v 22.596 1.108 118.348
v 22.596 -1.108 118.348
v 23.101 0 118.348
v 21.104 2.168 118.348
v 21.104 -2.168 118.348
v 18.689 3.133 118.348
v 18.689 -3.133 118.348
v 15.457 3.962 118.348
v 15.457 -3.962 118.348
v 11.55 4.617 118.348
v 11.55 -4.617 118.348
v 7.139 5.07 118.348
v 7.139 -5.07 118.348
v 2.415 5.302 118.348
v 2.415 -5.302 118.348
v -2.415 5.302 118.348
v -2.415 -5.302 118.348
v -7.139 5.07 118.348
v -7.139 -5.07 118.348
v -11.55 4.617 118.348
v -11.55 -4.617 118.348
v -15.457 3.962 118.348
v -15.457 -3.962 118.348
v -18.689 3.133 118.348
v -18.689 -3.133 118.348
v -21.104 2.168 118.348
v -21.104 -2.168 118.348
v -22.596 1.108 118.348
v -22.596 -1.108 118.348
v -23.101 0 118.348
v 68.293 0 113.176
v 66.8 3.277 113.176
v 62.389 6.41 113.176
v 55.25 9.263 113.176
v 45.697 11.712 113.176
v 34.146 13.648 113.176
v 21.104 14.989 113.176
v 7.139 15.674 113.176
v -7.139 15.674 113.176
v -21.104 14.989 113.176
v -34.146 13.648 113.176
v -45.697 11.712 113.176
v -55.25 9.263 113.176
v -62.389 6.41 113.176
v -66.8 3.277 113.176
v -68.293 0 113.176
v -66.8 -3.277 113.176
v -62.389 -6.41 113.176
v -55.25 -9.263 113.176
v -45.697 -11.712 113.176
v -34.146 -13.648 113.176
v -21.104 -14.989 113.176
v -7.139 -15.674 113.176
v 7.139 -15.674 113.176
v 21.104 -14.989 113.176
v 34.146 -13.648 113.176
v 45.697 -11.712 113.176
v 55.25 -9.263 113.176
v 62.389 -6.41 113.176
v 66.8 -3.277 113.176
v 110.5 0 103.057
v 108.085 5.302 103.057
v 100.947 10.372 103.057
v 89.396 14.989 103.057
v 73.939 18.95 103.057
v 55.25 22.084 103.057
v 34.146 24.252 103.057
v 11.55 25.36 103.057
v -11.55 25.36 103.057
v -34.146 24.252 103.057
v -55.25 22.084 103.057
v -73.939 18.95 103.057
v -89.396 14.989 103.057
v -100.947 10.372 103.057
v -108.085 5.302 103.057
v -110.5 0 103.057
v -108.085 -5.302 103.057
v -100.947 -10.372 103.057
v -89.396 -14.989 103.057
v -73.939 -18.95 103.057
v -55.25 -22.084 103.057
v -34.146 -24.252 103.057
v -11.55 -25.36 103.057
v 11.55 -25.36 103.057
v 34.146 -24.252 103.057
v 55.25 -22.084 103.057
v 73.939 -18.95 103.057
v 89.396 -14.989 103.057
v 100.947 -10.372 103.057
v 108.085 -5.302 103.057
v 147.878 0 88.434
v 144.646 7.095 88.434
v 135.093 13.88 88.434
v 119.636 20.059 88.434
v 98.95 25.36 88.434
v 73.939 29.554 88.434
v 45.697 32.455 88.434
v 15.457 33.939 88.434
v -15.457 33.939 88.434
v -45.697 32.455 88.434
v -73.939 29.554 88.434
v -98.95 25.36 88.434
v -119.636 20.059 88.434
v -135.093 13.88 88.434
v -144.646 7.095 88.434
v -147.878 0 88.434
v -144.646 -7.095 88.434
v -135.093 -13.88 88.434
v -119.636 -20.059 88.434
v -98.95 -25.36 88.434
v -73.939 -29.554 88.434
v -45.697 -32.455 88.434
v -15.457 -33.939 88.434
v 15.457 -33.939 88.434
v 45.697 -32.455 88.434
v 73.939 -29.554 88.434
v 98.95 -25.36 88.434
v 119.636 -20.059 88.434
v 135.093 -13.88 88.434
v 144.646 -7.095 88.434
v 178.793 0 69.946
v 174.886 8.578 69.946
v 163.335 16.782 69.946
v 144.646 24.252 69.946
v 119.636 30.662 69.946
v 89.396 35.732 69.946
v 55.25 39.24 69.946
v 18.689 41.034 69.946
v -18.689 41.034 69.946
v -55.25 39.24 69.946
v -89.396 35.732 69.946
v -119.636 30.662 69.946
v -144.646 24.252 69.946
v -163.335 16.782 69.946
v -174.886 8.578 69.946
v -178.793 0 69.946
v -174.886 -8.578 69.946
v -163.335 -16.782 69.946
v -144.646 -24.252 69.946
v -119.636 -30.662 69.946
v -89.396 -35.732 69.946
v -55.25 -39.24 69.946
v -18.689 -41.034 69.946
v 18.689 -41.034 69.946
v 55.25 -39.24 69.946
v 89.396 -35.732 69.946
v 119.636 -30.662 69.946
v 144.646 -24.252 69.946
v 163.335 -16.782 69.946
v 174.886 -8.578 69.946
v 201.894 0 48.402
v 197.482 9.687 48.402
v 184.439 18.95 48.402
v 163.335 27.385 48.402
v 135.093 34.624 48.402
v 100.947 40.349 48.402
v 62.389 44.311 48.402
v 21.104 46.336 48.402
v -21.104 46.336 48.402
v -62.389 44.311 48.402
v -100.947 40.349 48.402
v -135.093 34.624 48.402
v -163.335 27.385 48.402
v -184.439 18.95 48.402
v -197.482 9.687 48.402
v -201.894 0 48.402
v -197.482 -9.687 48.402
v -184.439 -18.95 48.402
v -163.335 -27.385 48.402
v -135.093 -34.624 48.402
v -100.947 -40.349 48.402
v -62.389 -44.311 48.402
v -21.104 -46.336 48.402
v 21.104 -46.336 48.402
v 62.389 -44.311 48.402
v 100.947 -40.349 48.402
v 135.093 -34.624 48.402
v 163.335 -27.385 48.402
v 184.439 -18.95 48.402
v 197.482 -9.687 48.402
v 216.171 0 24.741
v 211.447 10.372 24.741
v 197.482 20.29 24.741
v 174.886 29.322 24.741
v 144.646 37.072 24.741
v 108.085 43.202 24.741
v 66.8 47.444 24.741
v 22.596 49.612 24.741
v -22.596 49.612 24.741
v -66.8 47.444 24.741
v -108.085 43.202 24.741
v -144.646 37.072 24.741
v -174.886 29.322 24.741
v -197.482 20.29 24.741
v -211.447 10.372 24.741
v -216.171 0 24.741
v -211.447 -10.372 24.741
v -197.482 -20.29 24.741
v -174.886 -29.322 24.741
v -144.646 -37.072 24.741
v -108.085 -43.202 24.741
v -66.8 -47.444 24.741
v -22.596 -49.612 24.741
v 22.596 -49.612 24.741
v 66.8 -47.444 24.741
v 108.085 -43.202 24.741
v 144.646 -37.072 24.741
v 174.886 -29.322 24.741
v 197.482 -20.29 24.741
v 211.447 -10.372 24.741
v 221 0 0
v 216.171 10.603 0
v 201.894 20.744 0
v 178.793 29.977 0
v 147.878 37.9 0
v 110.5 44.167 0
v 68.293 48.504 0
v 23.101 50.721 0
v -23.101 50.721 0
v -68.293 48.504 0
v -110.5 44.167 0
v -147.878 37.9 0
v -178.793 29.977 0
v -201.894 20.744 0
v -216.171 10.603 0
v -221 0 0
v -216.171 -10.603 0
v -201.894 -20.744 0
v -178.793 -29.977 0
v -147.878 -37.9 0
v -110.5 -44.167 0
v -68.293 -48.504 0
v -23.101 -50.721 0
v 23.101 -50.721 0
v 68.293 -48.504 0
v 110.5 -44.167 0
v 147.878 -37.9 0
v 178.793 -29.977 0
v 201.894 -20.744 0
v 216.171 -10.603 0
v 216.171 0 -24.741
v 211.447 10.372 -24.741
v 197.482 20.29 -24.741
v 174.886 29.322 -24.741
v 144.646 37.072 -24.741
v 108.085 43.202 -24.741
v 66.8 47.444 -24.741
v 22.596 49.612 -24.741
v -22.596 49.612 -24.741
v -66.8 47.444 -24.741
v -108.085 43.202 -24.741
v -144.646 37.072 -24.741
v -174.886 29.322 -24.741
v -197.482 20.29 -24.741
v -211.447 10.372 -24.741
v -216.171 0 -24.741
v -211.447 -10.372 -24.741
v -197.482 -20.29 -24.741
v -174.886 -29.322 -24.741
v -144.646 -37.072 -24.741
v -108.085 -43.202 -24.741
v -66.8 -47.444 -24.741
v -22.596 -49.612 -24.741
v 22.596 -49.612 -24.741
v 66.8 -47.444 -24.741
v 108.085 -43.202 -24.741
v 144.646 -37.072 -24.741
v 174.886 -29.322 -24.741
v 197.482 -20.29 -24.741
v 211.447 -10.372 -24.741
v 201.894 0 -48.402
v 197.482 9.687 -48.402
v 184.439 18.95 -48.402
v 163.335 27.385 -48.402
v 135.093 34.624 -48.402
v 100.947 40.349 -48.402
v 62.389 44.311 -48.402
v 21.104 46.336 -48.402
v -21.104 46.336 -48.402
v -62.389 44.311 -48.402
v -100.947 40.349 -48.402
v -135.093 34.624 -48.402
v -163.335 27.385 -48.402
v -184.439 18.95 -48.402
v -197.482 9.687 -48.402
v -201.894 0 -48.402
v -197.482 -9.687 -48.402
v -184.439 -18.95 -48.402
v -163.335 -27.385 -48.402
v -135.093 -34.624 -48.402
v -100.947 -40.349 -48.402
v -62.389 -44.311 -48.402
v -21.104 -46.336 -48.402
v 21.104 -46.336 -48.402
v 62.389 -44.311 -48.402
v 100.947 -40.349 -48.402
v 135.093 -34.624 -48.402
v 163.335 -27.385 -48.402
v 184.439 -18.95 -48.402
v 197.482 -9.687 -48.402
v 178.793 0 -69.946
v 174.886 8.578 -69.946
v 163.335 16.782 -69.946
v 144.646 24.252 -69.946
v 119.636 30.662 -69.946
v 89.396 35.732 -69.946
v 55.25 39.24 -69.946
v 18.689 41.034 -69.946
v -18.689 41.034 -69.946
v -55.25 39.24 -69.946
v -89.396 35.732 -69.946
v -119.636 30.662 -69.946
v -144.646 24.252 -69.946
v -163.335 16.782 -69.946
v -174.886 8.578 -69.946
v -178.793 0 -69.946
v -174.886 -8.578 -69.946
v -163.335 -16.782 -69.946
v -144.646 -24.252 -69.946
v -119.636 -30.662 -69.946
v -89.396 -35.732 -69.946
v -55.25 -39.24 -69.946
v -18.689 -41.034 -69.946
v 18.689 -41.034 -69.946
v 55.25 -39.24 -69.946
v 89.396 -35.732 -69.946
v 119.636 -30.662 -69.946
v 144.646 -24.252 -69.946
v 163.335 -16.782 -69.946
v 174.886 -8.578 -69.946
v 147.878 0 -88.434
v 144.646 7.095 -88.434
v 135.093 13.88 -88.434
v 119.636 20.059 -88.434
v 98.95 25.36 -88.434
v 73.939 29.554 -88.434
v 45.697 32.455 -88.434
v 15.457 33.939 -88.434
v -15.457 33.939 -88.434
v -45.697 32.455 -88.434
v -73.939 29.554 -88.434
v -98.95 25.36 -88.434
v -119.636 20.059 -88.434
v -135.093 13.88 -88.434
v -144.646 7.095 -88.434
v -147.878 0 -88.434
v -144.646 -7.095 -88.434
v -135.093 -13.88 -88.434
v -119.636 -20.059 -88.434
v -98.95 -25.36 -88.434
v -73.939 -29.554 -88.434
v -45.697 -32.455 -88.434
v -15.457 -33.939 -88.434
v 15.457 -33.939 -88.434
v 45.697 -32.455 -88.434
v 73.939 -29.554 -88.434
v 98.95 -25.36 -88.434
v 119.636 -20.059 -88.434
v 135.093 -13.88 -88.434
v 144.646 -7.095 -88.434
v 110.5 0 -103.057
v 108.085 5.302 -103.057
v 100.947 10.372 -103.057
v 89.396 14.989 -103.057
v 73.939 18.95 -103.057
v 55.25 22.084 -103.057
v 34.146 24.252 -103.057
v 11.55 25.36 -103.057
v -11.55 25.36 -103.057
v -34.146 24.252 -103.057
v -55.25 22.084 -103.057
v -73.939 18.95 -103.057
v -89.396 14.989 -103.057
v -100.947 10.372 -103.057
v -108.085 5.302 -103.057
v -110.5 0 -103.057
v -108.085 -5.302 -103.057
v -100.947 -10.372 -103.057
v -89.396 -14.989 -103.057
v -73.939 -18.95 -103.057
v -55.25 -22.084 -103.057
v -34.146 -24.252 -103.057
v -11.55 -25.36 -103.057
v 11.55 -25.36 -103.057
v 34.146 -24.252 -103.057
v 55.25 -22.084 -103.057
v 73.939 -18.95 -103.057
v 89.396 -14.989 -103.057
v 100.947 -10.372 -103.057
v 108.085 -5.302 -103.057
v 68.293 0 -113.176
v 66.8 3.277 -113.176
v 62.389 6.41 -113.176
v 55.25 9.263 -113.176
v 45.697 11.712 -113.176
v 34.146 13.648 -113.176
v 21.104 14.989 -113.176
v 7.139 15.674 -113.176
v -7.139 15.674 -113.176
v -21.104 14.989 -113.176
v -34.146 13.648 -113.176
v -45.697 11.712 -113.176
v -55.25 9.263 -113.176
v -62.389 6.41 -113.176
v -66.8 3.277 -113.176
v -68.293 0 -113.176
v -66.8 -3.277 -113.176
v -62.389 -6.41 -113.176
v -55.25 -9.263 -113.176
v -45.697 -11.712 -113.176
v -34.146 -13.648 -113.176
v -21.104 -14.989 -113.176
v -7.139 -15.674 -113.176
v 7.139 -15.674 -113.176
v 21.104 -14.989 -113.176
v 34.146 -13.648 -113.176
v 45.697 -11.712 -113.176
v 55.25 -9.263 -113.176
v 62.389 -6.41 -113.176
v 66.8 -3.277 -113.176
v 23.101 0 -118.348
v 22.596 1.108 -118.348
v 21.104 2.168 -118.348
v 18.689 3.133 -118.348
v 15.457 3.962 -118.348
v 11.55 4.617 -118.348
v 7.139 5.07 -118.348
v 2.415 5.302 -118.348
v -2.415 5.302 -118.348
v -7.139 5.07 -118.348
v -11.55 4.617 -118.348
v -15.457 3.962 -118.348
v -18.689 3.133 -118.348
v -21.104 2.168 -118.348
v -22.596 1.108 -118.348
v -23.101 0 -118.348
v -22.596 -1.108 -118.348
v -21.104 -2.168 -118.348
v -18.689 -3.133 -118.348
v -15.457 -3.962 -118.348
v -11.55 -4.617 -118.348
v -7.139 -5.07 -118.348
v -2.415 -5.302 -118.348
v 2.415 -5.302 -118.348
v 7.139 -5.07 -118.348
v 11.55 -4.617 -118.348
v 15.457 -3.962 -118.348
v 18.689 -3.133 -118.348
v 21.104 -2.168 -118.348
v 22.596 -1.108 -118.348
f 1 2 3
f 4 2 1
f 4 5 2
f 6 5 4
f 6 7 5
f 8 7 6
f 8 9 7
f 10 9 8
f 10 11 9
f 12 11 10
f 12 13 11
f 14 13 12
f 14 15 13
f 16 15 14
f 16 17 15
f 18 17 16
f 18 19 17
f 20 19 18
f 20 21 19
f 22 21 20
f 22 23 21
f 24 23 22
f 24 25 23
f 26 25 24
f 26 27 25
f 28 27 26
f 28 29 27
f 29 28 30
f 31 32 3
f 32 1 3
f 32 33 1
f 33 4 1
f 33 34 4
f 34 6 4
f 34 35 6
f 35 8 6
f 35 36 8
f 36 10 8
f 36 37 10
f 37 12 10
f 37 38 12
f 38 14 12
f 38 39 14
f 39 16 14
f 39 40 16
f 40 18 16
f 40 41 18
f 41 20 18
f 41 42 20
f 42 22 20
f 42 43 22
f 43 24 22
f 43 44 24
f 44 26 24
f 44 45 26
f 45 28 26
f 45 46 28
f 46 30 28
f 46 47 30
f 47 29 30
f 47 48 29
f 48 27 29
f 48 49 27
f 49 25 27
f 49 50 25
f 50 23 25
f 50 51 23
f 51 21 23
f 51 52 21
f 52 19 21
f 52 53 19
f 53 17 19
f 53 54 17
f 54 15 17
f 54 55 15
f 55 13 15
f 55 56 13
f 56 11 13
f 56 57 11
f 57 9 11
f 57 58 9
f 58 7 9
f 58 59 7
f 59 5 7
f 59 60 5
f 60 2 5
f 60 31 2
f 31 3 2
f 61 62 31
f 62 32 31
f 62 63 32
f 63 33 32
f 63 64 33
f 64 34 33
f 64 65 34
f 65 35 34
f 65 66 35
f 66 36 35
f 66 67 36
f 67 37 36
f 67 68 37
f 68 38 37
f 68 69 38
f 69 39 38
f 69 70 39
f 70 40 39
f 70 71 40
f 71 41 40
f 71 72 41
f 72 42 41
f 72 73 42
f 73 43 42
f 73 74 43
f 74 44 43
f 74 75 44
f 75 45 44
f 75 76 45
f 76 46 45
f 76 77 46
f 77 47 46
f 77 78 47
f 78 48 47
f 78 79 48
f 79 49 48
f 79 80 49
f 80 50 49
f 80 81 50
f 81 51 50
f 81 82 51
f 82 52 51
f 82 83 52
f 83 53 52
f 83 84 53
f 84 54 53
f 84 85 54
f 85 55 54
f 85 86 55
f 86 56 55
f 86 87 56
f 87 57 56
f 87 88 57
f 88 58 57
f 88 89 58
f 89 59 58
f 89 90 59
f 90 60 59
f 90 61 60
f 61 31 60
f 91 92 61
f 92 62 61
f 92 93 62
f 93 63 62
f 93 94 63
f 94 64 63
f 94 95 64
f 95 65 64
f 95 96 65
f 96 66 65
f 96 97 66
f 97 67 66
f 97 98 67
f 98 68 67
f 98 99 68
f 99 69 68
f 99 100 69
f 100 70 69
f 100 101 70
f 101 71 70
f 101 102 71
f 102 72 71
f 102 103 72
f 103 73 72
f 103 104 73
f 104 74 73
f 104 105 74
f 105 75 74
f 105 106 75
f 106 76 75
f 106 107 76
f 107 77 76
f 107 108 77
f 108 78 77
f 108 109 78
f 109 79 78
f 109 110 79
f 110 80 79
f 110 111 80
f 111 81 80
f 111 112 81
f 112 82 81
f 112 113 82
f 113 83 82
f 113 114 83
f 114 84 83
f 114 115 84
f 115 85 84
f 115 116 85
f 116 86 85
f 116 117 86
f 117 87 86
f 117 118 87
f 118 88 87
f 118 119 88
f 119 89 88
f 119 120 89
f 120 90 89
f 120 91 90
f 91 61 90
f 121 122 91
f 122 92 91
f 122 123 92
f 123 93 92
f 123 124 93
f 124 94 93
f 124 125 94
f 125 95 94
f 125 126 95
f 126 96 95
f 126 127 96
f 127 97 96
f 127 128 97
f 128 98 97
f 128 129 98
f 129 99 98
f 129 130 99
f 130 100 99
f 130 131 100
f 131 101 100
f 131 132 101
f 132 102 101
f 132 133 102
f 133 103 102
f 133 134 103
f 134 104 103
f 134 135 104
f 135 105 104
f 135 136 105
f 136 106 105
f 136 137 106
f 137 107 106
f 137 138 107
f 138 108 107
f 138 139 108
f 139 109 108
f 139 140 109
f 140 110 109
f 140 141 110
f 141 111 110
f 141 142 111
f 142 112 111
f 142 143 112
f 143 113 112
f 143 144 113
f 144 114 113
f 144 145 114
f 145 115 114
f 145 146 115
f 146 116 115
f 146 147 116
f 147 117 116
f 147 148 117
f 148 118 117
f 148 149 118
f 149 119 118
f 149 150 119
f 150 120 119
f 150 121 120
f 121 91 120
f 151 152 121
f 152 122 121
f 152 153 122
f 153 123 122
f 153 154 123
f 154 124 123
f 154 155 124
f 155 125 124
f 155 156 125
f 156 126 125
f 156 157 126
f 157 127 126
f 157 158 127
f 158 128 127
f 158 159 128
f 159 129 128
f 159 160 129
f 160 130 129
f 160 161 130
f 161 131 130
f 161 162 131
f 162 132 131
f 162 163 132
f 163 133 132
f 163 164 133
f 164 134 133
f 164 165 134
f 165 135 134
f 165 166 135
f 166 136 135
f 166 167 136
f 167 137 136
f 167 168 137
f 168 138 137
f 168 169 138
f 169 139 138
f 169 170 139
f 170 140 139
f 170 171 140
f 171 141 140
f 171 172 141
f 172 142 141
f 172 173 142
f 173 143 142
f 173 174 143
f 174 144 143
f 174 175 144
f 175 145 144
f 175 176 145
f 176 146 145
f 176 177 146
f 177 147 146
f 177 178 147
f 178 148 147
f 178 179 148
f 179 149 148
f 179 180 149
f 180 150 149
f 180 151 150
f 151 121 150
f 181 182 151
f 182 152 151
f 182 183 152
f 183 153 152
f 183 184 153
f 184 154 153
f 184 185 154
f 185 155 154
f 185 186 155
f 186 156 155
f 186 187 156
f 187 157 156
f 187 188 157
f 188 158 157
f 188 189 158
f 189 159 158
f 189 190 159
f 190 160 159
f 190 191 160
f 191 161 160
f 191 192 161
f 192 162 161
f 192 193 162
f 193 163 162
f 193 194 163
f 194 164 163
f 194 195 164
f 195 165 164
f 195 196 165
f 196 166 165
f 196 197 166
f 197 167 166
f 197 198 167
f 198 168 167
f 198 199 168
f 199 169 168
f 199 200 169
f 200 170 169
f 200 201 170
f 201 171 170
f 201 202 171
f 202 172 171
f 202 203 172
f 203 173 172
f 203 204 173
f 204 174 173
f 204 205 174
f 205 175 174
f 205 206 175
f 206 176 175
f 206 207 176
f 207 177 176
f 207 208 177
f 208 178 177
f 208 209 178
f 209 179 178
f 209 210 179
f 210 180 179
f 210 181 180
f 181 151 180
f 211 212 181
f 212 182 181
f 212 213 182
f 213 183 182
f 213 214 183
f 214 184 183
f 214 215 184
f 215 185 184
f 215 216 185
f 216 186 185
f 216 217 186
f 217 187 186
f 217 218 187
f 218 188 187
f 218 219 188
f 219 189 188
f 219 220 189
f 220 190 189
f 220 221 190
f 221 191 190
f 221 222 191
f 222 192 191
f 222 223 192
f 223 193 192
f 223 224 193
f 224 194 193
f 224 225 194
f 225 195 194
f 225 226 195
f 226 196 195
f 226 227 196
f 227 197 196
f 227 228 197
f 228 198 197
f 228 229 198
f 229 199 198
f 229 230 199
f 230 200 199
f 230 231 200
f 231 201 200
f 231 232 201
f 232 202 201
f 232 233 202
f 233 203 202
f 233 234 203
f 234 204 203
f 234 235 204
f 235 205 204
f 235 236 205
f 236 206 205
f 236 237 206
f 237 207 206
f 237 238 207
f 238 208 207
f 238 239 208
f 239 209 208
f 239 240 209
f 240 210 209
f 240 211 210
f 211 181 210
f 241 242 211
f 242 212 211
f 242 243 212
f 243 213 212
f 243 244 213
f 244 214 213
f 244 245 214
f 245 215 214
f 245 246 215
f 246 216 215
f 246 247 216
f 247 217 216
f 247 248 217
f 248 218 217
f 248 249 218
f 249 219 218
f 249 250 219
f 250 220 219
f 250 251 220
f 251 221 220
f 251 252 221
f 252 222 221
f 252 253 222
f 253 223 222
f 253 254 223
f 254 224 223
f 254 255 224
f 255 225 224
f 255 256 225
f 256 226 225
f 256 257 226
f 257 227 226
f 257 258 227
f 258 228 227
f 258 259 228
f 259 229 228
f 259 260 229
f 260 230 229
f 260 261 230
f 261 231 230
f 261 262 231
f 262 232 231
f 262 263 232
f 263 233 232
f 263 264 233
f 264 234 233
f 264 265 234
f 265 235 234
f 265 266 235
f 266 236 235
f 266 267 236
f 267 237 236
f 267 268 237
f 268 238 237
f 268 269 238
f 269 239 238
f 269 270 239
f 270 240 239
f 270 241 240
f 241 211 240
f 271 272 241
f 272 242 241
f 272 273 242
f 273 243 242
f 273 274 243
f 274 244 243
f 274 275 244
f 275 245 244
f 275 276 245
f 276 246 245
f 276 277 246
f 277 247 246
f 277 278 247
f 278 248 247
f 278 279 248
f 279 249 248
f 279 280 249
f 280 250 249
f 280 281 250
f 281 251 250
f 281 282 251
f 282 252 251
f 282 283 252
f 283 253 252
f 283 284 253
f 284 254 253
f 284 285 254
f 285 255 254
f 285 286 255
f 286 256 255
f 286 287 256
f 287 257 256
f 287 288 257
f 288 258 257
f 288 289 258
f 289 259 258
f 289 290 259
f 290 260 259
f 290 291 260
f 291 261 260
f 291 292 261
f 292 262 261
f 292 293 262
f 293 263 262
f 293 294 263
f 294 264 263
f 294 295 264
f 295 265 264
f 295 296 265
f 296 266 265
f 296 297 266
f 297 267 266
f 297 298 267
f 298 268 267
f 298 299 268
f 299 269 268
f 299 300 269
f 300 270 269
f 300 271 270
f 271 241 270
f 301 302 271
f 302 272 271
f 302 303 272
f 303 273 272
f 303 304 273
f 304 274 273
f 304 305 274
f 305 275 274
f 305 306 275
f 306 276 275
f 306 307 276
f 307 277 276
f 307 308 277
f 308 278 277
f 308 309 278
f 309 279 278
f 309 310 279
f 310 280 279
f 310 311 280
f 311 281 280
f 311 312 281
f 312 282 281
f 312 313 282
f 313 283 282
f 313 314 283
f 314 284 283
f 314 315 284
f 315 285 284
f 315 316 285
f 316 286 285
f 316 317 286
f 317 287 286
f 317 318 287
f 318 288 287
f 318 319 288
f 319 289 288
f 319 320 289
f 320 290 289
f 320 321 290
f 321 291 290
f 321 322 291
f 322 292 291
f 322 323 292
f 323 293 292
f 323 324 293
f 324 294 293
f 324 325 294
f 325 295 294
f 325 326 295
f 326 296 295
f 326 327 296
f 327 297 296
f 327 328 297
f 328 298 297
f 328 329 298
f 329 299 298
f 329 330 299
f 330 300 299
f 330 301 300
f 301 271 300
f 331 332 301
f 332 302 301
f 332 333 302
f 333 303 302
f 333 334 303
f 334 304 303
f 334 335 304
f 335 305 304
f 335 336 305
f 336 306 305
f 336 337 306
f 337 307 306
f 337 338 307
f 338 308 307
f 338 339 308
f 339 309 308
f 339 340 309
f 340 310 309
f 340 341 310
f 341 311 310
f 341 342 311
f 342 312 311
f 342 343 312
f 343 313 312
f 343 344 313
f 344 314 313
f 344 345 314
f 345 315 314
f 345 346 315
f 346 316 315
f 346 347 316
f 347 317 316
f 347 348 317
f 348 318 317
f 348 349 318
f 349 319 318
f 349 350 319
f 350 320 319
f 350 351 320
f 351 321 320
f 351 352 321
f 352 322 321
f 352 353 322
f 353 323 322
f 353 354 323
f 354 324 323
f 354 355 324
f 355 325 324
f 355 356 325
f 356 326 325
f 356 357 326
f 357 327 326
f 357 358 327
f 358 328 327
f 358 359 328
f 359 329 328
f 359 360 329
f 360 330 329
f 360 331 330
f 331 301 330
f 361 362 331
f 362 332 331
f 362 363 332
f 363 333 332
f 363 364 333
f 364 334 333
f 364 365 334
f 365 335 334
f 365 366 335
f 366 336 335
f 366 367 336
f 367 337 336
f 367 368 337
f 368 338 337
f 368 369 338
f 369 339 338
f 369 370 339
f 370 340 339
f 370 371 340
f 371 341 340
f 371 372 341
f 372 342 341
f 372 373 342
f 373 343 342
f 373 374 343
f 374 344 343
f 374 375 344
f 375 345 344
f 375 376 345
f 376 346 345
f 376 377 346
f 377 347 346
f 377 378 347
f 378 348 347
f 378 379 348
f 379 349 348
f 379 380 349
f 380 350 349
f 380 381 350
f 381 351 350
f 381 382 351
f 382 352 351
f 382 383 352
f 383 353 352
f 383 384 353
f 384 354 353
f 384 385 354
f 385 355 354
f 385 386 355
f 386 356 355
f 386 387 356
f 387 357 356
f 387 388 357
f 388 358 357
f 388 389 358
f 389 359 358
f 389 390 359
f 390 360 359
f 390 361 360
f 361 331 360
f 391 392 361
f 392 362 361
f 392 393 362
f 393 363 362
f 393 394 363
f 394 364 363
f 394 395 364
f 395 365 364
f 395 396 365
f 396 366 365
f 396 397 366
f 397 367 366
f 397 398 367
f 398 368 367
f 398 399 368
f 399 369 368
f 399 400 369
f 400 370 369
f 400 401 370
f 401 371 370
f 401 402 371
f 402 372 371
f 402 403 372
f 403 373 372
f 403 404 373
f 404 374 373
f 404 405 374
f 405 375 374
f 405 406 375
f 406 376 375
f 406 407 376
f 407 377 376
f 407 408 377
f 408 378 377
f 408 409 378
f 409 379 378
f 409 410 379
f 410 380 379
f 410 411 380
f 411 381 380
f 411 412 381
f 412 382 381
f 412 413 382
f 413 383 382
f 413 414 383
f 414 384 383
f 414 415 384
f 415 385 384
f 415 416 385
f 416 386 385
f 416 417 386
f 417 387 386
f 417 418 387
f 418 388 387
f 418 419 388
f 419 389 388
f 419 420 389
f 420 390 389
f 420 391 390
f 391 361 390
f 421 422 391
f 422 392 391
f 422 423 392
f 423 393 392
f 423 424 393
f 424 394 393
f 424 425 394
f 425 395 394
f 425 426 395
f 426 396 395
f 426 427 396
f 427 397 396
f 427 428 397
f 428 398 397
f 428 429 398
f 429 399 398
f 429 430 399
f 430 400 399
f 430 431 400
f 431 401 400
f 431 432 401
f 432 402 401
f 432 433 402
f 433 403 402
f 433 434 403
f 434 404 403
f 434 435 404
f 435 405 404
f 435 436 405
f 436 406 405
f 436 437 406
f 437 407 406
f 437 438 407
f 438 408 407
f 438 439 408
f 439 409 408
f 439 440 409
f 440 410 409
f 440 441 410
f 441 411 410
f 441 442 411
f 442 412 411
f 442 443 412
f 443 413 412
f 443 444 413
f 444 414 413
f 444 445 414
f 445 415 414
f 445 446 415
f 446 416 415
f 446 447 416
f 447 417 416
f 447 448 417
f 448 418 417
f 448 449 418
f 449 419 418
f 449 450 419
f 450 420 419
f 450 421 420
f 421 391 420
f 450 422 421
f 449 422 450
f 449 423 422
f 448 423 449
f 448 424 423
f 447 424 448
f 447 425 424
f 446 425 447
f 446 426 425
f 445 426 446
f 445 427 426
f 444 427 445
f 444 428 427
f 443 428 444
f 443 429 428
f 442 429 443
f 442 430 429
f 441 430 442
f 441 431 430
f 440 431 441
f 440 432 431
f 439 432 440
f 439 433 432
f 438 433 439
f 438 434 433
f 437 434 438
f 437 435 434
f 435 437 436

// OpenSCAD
// Generated by SolidPython 1.0.1 on 2020-07-29 00:46:50


scale(v = [13, 3, 7]) {
	sphere(r = 17);
}
/***********************************************
*********      SolidPython code:      **********
************************************************
 
# import packages: SolidPython
from solid import *
from solid.utils import *
from itertools import chain, combinations, permutations


class Resize:

    def __init__(self, scad_file):
        self.scad_file = scad_file
        #self.scad_file = import_scad(scad_file)
        # cone/cylinder param:
        self.r1 = 0
        self.r2 = 0
        self.h = 0
        # rectangular prism param:
        self.w = 0
        self.l = 0
        # ellipse param:
        self.r = 0

    # import OpenScad code (file name corresponds to shape)


    # classify shape + parameters
    def assign(self, param1, param2, param3):
        if self.scad_file == 'cone.scad':
            self.r1 = param1
            self.r2 = param2
            self.h = param3
        elif self.scad_file == 'cylinder.scad':
            self.r1 = param1
            self.r2 = param2
            self.h = param3
        elif self.scad_file == 'rectangularPrism.scad':
            self.h = param1
            self.l = param2
            self.w = param3
        else:
            self.r = param1
            self.h = param2

    # resize parameters
    def iterate(self):
        x = range(3, 20, 2)
        i = 1
        if self.scad_file == 'cone.scad':
            tempList = list(permutations(x, 2))
            for temp in tempList:
                param1 = temp[0]
                param2 = temp[1]
                filepath = 'produced_scad_files/' + 'cone' + str(param1) + '_' + str(param2) + '_' + '.scad'
                scad_render_to_file(cylinder(h=param1, r1=param2, r2=0), filepath)

        elif self.scad_file == 'cylinder.scad':
            tempList = list(permutations(x, 3))
            for temp in tempList:
                param1 = temp[0]
                param2 = temp[1]
                filepath = 'produced_scad_files/' + 'cylinder' + str(param1) + '_' + str(param2) + '_' + '.scad'
                scad_render_to_file(cylinder(h=param1, r1=param2, r2=param2), filepath)

        elif self.scad_file == 'rectangularPrism.scad':
            tempList = list(permutations(x, 3))
            for temp in tempList:
                param1 = temp[0]
                param2 = temp[1]
                param3 = temp[2]
                filepath = 'produced_scad_files/' + 'rectangularPrism' + str(param1) + '_' + str(param2) + '_' + str(
                    param3) + '.scad'
                scad_render_to_file(cube(size=(param1, param2, param3)), filepath)

        elif self.scad_file == 'ellipse.scad':
            tempList = list(permutations(x, 4))
            for temp in tempList:
                param1 = temp[0]
                param2 = temp[1]
                param3 = temp[2]
                param4 = temp[3]
                filepath = 'produced_scad_files/' + 'ellipse' + str(param1) + '_' + str(param2) + '_' + str(param3) + '_' + str(param4) + '.scad'
                scad_render_to_file(scale([param1, param2, param3])(sphere(r=param4)), filepath)

    def render_to_scadfile(self):
        scad_render_to_file(scad, 'example.scad') 
 
************************************************/
